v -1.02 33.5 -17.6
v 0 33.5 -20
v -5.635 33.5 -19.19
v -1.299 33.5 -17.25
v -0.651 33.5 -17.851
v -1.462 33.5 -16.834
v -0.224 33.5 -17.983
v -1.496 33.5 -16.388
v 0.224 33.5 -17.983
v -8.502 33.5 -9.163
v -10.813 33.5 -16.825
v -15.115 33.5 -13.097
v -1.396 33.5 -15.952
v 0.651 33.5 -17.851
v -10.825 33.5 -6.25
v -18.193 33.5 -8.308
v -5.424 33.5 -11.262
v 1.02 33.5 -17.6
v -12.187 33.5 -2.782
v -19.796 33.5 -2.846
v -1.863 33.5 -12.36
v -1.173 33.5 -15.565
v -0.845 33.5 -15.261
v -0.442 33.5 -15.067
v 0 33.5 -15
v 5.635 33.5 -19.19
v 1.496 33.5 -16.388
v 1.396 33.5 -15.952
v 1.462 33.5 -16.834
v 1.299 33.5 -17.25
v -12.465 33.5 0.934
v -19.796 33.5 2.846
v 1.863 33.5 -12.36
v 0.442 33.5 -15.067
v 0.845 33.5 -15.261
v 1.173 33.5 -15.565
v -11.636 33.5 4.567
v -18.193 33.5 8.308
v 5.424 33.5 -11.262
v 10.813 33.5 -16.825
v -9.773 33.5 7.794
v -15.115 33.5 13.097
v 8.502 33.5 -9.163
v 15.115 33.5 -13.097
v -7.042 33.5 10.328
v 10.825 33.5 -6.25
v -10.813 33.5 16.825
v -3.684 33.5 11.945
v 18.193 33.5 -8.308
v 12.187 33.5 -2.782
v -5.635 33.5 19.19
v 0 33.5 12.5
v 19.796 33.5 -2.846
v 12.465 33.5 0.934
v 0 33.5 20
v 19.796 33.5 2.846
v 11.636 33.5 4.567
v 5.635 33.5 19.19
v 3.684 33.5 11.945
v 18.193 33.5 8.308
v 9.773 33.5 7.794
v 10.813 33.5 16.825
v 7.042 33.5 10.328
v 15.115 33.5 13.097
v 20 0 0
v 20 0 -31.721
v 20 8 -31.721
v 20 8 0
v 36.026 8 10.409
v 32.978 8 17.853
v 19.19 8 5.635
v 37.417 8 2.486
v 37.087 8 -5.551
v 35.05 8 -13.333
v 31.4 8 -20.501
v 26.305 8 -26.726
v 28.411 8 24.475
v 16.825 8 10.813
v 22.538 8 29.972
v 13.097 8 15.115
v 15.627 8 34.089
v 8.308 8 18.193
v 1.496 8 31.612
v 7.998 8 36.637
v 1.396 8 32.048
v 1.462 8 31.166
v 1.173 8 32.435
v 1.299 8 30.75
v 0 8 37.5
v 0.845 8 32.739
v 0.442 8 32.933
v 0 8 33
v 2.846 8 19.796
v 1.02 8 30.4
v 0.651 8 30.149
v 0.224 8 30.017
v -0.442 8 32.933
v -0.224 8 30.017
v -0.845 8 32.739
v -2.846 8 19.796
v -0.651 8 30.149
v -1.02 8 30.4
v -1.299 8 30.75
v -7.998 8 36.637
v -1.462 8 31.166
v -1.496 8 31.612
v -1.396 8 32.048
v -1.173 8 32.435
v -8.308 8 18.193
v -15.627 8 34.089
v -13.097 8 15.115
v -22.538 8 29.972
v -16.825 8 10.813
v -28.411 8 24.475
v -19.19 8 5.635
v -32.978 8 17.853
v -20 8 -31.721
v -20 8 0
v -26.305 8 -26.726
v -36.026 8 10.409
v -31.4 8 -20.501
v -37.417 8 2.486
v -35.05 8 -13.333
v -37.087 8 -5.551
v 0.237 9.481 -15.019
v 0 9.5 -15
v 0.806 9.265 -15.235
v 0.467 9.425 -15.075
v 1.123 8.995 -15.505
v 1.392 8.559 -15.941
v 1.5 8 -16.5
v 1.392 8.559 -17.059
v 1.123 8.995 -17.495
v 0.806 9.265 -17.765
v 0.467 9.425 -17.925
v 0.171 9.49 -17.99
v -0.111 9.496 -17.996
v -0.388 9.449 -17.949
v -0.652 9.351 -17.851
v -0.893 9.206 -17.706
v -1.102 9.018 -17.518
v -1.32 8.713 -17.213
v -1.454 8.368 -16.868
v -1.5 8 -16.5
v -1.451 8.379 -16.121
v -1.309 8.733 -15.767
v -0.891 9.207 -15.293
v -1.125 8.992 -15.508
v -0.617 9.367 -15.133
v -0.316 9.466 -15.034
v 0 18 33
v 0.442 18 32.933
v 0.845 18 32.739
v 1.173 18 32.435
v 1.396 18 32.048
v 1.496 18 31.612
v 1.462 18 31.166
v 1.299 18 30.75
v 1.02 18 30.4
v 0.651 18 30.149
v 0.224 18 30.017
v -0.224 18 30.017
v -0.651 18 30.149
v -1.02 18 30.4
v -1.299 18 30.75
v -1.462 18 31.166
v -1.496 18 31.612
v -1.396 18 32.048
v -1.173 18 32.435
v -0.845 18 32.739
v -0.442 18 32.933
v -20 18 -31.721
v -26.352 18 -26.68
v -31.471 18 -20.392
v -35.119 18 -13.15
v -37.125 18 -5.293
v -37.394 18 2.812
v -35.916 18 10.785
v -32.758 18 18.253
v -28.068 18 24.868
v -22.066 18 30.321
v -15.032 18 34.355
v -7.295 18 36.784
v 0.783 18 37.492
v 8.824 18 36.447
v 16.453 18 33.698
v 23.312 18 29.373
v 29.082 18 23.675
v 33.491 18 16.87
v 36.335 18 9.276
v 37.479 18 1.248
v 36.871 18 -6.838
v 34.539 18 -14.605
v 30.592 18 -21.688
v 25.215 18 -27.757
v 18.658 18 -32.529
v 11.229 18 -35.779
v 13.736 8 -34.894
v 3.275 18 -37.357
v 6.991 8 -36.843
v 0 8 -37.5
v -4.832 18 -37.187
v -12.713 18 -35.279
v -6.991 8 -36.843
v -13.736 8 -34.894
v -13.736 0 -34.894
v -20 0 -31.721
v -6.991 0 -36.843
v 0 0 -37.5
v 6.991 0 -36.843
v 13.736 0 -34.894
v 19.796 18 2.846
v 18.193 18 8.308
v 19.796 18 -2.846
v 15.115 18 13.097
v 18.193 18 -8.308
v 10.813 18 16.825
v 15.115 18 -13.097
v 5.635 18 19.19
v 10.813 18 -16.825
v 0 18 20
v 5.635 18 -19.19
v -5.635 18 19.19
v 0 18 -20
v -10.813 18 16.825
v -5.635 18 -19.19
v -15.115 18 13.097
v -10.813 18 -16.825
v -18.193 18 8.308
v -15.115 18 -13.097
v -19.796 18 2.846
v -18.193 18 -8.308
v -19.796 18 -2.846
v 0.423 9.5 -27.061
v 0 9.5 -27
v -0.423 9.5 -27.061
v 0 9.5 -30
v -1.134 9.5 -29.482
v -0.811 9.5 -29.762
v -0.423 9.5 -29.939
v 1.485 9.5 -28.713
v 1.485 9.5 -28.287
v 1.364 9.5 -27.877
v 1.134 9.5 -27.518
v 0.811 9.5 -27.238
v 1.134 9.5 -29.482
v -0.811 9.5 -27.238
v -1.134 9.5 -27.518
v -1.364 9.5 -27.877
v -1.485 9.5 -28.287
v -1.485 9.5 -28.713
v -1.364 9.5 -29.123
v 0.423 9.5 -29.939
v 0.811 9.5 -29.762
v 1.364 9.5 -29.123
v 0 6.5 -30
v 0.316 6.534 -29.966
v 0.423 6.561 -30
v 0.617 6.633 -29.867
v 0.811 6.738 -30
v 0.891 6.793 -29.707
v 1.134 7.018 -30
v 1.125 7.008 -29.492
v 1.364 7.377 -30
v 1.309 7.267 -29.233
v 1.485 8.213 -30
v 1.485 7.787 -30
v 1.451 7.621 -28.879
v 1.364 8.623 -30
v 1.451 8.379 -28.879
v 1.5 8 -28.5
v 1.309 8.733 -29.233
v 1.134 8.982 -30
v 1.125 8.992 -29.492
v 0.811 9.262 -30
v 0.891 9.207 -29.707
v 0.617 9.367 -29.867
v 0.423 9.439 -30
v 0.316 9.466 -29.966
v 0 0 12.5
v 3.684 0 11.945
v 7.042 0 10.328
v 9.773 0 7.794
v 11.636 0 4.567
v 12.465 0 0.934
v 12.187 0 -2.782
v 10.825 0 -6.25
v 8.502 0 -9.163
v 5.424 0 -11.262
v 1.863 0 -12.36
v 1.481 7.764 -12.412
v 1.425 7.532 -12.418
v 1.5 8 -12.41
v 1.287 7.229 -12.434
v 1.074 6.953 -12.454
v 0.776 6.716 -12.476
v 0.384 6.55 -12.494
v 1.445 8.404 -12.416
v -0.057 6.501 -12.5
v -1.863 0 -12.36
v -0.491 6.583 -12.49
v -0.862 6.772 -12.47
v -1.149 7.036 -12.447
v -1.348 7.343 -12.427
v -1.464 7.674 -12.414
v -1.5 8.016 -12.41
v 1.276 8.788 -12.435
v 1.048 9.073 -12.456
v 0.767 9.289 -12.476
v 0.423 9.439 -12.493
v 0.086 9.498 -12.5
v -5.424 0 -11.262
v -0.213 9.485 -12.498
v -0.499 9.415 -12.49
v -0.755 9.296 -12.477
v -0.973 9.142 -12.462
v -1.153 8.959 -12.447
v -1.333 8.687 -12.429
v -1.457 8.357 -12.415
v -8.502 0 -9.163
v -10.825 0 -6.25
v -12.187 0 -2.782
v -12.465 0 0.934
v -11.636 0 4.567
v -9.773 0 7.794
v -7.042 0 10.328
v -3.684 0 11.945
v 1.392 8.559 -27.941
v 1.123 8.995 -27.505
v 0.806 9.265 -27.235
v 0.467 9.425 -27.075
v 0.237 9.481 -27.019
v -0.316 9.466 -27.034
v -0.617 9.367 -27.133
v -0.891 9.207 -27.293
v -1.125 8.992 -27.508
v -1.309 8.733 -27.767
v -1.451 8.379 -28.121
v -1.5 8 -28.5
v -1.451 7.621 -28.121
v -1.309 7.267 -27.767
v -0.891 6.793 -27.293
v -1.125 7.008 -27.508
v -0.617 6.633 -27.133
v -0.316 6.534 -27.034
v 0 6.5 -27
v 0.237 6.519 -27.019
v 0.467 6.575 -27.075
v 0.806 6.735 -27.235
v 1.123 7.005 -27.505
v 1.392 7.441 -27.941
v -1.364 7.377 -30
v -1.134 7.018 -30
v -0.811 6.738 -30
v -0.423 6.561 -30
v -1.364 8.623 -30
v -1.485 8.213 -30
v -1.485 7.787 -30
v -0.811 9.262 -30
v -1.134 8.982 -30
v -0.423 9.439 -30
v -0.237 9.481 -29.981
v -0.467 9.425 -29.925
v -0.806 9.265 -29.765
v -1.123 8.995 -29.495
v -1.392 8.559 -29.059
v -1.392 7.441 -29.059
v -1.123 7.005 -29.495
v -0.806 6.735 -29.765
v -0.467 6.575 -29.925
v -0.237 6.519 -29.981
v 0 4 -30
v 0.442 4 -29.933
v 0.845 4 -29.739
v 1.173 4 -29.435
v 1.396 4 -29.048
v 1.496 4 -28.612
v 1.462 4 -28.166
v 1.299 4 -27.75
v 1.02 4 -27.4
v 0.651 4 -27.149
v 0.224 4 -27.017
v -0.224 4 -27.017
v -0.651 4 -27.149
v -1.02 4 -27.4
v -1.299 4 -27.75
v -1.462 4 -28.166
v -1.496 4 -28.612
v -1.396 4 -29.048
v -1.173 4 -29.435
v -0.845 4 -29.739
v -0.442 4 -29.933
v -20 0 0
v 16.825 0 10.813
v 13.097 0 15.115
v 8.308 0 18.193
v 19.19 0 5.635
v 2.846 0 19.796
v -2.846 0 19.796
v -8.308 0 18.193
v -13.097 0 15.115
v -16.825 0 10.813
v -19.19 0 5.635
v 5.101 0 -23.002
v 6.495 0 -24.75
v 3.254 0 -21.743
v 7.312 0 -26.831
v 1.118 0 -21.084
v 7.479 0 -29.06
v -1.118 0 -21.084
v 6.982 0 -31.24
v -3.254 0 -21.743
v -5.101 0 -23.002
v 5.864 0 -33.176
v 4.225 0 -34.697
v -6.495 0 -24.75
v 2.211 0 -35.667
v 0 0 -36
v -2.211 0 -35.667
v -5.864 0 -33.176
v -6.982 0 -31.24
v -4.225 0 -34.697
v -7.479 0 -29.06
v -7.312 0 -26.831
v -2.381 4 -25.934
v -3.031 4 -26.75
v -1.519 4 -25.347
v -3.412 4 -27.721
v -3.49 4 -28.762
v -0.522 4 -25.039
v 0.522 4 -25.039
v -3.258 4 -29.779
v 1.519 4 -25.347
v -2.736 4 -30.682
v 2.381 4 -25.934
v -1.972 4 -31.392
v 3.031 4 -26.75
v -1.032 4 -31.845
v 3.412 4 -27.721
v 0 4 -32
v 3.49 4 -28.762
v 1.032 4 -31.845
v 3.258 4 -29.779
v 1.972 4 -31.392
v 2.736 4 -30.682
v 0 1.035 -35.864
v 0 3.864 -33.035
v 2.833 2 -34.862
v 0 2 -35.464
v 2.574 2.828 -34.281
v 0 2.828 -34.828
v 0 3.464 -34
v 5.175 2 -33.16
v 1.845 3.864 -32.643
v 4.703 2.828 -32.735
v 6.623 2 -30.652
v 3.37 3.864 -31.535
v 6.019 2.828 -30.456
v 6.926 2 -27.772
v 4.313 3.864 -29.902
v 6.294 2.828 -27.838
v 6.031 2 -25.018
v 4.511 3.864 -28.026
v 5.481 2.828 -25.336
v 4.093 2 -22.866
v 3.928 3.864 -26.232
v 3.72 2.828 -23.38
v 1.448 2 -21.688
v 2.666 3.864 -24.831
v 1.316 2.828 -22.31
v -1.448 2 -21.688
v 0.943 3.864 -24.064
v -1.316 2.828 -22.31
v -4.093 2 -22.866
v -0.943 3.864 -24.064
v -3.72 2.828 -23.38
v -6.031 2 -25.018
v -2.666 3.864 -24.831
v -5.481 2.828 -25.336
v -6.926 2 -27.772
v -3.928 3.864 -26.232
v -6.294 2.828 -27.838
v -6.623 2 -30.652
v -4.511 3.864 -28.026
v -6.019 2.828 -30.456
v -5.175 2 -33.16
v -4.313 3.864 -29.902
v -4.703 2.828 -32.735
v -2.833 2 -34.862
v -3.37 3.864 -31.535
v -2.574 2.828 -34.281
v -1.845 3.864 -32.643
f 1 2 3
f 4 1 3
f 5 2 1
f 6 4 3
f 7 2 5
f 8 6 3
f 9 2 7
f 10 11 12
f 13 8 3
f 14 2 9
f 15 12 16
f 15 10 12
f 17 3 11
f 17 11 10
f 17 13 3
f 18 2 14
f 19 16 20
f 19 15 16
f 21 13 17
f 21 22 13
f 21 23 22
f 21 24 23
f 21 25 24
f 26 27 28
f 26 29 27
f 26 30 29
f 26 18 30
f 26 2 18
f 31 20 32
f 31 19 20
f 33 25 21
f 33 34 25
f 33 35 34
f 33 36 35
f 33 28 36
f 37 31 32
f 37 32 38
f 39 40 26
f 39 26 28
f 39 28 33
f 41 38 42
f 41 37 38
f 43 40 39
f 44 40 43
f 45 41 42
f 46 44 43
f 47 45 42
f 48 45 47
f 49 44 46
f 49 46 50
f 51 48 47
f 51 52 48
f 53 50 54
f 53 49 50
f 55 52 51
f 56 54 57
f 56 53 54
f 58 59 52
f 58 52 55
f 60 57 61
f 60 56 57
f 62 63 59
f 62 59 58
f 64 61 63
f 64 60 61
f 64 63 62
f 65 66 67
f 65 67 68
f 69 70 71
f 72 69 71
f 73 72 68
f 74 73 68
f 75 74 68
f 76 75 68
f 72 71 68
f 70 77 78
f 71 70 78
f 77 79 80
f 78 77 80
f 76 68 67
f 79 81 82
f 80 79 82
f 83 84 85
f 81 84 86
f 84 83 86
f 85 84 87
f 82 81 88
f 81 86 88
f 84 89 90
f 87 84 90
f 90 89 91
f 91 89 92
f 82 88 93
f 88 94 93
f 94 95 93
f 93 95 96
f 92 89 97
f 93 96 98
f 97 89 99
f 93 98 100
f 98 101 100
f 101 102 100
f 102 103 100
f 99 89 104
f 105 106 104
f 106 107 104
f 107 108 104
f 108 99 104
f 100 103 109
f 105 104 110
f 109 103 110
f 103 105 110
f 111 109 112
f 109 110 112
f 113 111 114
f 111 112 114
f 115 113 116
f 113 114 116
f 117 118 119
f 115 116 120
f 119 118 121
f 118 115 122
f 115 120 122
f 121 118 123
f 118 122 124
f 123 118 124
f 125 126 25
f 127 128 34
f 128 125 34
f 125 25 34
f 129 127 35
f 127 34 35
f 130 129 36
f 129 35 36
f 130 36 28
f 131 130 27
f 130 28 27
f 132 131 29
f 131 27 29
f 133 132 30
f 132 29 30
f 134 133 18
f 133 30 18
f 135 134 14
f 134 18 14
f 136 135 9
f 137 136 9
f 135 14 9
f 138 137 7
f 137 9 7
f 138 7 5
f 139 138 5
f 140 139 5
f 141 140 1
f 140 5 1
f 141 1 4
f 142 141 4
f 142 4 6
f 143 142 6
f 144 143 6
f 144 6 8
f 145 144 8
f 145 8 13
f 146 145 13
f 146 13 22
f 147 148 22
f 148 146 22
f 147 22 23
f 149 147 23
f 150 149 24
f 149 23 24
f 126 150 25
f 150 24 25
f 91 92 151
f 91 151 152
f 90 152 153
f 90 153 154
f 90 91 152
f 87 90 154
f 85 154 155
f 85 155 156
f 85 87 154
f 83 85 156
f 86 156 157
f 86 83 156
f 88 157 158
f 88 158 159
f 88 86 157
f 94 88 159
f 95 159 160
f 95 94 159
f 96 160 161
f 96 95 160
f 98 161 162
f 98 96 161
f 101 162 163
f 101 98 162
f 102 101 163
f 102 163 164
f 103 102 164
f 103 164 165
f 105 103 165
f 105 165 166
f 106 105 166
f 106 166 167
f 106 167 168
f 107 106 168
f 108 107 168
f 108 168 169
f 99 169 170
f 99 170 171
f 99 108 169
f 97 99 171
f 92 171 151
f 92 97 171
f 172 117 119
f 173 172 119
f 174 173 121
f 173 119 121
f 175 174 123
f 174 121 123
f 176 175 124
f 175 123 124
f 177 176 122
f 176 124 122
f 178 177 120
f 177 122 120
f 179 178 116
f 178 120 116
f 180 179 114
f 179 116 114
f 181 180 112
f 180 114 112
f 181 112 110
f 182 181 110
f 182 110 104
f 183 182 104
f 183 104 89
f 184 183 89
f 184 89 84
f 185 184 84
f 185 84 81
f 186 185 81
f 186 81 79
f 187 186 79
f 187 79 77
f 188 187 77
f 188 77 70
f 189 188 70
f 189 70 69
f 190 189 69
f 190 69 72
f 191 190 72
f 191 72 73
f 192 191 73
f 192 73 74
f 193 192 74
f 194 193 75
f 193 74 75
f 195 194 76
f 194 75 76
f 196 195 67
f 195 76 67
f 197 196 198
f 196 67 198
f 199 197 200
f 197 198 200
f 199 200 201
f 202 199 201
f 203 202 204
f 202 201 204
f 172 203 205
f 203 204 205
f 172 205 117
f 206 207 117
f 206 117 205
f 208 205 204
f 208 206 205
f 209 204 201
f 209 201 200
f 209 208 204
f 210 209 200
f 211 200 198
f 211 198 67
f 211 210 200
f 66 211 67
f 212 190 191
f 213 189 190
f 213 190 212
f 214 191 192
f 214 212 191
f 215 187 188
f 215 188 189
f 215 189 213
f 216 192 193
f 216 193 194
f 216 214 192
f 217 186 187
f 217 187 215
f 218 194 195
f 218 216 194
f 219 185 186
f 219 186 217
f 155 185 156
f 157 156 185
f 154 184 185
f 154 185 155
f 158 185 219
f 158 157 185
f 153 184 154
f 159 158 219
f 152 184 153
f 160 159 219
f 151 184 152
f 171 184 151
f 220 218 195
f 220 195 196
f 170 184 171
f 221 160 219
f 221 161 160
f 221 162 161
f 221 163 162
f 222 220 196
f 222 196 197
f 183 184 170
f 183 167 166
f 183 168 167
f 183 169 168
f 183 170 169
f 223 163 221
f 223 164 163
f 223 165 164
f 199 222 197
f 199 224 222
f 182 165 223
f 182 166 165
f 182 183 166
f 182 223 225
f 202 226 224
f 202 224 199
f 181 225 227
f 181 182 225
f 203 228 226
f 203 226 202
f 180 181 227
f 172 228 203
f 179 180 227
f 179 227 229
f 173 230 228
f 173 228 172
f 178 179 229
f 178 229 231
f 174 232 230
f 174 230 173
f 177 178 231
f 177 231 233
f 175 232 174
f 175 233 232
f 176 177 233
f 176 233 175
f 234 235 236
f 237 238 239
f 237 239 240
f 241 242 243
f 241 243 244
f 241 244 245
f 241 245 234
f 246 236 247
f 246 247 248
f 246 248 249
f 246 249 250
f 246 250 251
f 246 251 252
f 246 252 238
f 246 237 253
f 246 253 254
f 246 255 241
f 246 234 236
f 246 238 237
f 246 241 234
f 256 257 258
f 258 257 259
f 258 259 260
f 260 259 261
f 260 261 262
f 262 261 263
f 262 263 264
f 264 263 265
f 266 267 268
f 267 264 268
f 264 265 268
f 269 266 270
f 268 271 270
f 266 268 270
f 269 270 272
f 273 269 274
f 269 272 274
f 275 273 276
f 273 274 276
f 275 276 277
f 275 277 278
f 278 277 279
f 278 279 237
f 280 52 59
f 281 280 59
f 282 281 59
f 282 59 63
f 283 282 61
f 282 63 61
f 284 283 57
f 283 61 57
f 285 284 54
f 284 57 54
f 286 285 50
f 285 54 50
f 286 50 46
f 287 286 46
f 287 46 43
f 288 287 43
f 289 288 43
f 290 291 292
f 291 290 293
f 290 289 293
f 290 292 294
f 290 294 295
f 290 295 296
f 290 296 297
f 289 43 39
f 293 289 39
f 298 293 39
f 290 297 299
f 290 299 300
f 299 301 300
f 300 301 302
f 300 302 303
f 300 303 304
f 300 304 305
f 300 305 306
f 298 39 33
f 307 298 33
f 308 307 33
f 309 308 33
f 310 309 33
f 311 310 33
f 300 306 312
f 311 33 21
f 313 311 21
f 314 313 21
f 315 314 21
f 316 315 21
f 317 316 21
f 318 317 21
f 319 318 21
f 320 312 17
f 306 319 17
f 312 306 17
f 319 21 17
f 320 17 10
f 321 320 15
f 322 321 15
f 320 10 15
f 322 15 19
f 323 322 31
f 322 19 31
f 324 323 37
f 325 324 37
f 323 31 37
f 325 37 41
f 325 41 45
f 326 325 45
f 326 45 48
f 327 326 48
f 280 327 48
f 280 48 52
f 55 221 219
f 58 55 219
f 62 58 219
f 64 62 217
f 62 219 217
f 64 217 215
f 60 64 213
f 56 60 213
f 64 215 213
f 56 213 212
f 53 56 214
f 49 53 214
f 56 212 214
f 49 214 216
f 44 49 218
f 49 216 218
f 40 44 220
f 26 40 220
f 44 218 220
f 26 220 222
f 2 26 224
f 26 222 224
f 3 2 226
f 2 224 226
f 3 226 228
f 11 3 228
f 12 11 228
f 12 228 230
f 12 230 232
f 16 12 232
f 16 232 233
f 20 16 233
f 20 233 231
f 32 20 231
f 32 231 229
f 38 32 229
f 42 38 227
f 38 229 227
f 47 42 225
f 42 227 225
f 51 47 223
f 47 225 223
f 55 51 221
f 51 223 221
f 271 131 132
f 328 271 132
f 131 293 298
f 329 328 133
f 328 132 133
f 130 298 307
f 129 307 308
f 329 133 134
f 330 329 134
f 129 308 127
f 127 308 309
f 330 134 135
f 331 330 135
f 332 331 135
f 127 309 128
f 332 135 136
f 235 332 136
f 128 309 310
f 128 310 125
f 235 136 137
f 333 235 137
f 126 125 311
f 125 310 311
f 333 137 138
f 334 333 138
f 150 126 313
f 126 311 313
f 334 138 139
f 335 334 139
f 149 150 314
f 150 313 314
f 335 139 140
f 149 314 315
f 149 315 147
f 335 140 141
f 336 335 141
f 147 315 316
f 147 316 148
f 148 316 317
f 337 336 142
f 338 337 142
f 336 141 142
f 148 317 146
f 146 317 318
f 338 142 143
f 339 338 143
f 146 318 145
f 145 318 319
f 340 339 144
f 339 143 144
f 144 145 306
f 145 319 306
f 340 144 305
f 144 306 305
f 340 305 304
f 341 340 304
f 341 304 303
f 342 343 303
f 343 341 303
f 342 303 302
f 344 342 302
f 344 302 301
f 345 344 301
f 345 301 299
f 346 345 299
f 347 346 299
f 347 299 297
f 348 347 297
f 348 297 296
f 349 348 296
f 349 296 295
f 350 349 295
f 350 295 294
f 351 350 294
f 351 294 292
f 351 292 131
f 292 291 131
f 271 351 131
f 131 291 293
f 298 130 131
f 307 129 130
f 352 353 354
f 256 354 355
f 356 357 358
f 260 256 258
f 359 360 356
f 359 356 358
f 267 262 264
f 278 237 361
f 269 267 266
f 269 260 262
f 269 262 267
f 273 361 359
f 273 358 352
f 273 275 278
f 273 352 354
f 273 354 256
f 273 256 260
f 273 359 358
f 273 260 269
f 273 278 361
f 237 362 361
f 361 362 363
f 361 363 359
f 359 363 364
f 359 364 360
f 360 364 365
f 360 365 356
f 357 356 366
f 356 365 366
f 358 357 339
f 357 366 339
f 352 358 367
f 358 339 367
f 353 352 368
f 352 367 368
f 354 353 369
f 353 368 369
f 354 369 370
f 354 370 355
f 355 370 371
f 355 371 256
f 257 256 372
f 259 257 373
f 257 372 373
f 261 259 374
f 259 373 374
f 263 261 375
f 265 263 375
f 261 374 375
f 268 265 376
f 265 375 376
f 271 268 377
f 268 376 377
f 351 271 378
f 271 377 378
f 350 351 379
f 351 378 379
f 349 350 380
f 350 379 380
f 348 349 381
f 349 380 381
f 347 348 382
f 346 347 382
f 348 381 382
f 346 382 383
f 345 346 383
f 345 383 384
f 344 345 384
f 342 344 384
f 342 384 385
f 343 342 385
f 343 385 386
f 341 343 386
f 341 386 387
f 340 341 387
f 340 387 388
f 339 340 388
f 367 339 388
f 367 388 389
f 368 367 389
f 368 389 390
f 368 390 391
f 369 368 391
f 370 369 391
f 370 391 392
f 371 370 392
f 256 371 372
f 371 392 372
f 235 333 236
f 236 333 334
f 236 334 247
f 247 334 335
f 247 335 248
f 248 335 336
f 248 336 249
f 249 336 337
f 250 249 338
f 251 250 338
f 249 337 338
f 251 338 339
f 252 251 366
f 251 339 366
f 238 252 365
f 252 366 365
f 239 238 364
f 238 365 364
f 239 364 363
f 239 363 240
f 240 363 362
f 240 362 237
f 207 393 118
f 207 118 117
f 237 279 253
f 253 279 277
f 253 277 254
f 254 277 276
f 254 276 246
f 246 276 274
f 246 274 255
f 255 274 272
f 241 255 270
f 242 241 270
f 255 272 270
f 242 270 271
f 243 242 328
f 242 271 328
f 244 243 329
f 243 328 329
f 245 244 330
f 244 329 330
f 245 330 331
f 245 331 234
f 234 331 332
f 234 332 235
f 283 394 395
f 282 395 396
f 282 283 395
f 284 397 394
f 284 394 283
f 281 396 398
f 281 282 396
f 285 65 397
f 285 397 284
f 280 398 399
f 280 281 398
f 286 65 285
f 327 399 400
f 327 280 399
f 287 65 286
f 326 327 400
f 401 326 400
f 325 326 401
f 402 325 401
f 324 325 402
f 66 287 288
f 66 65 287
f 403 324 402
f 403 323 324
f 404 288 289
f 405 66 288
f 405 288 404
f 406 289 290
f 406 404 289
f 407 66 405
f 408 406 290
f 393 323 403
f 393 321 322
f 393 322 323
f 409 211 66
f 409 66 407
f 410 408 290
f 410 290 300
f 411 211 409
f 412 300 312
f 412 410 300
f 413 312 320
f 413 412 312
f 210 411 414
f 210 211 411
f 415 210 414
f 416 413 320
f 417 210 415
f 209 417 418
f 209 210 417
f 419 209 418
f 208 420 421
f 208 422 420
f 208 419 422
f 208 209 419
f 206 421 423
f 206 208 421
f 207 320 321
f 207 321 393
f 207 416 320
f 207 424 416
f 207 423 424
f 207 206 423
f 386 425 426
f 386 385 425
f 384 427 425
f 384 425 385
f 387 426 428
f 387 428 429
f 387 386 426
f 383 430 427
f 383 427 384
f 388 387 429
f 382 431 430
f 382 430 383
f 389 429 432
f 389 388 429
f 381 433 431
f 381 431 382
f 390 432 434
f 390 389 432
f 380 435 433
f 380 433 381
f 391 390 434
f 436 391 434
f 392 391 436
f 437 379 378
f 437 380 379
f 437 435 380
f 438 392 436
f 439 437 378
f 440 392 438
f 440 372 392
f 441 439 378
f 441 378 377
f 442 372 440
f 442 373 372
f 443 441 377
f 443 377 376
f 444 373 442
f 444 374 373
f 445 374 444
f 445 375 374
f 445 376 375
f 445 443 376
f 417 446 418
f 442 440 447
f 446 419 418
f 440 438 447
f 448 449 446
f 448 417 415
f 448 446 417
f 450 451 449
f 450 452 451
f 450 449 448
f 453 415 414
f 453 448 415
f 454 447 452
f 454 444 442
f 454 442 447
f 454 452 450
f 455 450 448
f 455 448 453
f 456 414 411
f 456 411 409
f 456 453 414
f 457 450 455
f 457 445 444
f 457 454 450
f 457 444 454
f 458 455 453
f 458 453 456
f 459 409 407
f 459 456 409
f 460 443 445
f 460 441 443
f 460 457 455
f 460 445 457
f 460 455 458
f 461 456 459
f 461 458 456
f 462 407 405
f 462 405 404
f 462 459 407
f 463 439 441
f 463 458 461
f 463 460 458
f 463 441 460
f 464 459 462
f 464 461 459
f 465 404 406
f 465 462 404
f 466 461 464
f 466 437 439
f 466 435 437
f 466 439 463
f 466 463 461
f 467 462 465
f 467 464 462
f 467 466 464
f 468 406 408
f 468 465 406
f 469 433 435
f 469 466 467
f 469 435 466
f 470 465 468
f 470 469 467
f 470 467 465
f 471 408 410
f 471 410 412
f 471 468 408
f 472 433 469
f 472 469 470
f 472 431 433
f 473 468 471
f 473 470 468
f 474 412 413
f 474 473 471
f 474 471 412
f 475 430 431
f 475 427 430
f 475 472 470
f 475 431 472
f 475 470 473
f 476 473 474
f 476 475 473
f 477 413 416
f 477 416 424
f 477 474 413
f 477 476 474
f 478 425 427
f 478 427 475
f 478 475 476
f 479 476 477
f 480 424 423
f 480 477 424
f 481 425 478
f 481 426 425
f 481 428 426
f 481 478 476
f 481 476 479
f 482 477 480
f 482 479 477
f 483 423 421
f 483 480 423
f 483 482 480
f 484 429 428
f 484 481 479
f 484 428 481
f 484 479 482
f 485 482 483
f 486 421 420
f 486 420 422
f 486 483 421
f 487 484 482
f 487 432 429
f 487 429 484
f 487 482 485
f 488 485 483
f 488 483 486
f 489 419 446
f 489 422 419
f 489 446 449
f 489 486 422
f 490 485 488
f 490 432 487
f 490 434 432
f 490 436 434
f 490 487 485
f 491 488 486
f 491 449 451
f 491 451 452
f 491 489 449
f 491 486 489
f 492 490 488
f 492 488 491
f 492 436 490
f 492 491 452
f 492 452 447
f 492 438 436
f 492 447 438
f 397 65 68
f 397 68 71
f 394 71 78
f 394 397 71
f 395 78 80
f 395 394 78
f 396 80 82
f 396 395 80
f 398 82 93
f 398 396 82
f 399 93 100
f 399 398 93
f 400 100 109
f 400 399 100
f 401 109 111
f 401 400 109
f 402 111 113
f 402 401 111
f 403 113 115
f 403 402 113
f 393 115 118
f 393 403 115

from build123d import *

# Parameters (mm, degrees)
EXTRUDE_1_DEPTH     = 8
SKETCH_2_R          = 37.5
SKETCH_2_R_2        = 1.5
EXTRUDE_2_DEPTH     = 10
SKETCH_3_R          = 20
EXTRUDE_3_DEPTH     = 15.5
SKETCH_4_R          = 12.5
CUT_EXTRUDE_1_DEPTH = 63.727585638
SKETCH_5_R          = 7.5
CUT_EXTRUDE_2_DEPTH = 4
FILLET_1_R          = 4
SKETCH_6_R          = 1.5
CUT_EXTRUDE_3_DEPTH = 5.5
SKETCH_9_R          = 1.5
CUT_EXTRUDE_4_DEPTH = 30
SKETCH_10_R         = 1.5
CUT_EXTRUDE_5_DEPTH = 25.5


with BuildPart() as part:
    # 草图1 → 凸台-拉伸1 (new body)
    with BuildSketch(Plane(origin=(0, 0, 0), x_dir=(1, 0, 0), z_dir=(0, 1, 0))):
        with BuildLine():
            Line((-20, 0), (-20, 31.721443851))
            ThreePointArc((-20, 31.721443851), (0, 37.5), (20, 31.721443851))
            Line((20, 31.721443851), (20, 0))
            ThreePointArc((20, 0), (0, -20), (-20, 0))
        make_face()
    extrude(amount=EXTRUDE_1_DEPTH)

    # 草图2 → 凸台-拉伸2 (add)
    with BuildSketch(Plane(origin=(0, 8, 0), x_dir=(1, 0, 0), z_dir=(0, 1, 0))):
        with Locations(Location((0, 0, 0), (0, 0, 122.230952636))):
            Circle(SKETCH_2_R)
        with Locations(Location((0, -31.5, 0), (0, 0, 270))):
            Circle(SKETCH_2_R_2, mode=Mode.SUBTRACT)
    extrude(amount=EXTRUDE_2_DEPTH)

    # 草图3 → 凸台-拉伸3 (add)
    with BuildSketch(Plane(origin=(0, 18, 0), x_dir=(1, 0, 0), z_dir=(0, 1, 0))):
        with Locations(Location((0, 0, 0), (0, 0, 270))):
            Circle(SKETCH_3_R)
    extrude(amount=EXTRUDE_3_DEPTH)

    # 草图4 → 切除-拉伸1 (cut, through all)
    with BuildSketch(Plane(origin=(0, 33.5, 0), x_dir=(1, 0, 0), z_dir=(0, 1, 0))):
        with Locations(Location((0, 0, 0), (0, 0, 270))):
            Circle(SKETCH_4_R)
    extrude(amount=-CUT_EXTRUDE_1_DEPTH, mode=Mode.SUBTRACT)

    # 草图5 → 切除-拉伸2 (cut)
    with BuildSketch(Plane.XZ):
        with Locations(Location((0, -28.5, 0), (0, 0, 270))):
            Circle(SKETCH_5_R)
    extrude(amount=-CUT_EXTRUDE_2_DEPTH, mode=Mode.SUBTRACT)

    # 圆角1
    fillet_1_edges = [part.edges().sort_by_distance(p)[0] for p in [
        (0, 4, -21),
    ]]
    fillet(fillet_1_edges, radius=FILLET_1_R - 0.0001)  # a hair under: the kernel refuses the full size

    # 草图6 → 切除-拉伸3 (cut)
    with BuildSketch(Plane.XZ.offset(-4)):
        with Locations(Location((0, -28.5, 0), (0, 0, 270))):
            Circle(SKETCH_6_R)
    extrude(amount=-CUT_EXTRUDE_3_DEPTH, mode=Mode.SUBTRACT)

    # 草图9 → 切除-拉伸4 (cut)
    with BuildSketch(Plane.XY):
        with Locations((0, 8)):
            Circle(SKETCH_9_R)
    extrude(amount=-CUT_EXTRUDE_4_DEPTH, mode=Mode.SUBTRACT)

    # 草图10 → 切除-拉伸5 (cut)
    with BuildSketch(Plane(origin=(0, 33.5, 0), x_dir=(1, 0, 0), z_dir=(0, 1, 0))):
        with Locations(Location((0, 16.5, 0), (0, 0, 270))):
            Circle(SKETCH_10_R)
    extrude(amount=-CUT_EXTRUDE_5_DEPTH, mode=Mode.SUBTRACT)


solid = part.part
